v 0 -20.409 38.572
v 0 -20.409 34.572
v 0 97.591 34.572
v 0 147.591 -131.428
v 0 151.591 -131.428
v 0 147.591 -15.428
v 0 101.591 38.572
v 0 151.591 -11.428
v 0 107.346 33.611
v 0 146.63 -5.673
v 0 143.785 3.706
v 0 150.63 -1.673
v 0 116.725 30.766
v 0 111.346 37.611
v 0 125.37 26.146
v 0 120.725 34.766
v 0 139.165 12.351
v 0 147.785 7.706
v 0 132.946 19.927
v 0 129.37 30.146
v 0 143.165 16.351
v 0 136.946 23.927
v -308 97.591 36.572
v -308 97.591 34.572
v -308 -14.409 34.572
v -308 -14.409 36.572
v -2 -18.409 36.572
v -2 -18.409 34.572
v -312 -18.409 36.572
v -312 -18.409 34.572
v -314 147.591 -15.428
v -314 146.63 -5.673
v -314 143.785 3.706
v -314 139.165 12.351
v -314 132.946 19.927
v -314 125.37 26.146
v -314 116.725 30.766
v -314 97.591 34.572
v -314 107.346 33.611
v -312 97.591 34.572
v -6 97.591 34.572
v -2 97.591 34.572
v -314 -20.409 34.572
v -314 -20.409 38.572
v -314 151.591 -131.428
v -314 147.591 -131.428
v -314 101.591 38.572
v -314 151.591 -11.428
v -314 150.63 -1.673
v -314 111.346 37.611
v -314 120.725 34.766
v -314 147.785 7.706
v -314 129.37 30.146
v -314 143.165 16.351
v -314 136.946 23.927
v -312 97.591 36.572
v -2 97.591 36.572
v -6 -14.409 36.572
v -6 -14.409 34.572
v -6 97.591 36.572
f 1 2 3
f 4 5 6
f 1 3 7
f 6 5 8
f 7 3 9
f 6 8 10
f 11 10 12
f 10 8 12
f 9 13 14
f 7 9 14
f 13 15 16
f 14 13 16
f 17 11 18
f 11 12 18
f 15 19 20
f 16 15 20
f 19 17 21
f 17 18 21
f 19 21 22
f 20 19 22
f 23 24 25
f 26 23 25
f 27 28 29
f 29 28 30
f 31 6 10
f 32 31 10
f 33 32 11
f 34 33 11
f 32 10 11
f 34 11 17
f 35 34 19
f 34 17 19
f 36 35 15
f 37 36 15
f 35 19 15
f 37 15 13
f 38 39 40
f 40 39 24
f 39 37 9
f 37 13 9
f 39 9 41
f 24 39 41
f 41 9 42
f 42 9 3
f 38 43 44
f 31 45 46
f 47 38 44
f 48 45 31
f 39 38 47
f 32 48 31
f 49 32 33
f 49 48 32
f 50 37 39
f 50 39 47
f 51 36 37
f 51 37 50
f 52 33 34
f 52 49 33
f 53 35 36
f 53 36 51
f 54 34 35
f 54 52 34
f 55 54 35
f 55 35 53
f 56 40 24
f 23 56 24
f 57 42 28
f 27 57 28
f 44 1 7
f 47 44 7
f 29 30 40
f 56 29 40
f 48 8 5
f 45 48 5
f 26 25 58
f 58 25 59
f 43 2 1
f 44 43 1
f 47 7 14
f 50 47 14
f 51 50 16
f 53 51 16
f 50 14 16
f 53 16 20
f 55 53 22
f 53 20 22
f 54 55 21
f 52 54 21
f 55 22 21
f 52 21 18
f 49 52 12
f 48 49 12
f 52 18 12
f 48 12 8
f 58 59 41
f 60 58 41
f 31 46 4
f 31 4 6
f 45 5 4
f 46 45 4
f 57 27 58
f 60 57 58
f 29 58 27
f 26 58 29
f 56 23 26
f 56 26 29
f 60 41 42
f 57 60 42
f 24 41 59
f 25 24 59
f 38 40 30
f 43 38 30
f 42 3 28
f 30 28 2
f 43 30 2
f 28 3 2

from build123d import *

# Parameters (mm, degrees)
SALIENTE_EXTRUIR1_DEPTH = 314
CORTAR_EXTRUIR1_DEPTH   = 2


with BuildPart() as part:
    # Croquis2 → Saliente-Extruir1 (new body)
    with BuildSketch(Plane(origin=(0, 0, 0), x_dir=(0, 0, -1), z_dir=(1, 0, 0))):
        with BuildLine():
            Line((-38.572123539, -20.408891327), (-38.572123539, 101.591108673))
            ThreePointArc((-38.572123539, 101.591108673), (-23.927462599, 136.946447732), (11.427876461, 151.591108673))
            Line((11.427876461, 151.591108673), (131.427876461, 151.591108673))
            Line((131.427876461, 151.591108673), (131.427876461, 147.591108673))
            Line((131.427876461, 147.591108673), (15.427876461, 147.591108673))
            ThreePointArc((15.427876461, 147.591108673), (-19.927462599, 132.946447732), (-34.572123539, 97.591108673))
            Line((-34.572123539, 97.591108673), (-34.572123539, -20.408891327))
            Line((-34.572123539, -20.408891327), (-38.572123539, -20.408891327))
        make_face()
    extrude(amount=-SALIENTE_EXTRUIR1_DEPTH)

    # Croquis3 → Cortar-Extruir1 (cut)
    with BuildSketch(Plane(origin=(0, 0, 34.572123539), x_dir=(-1, 0, 0), z_dir=(0, 0, -1))):
        Polygon((2, 97.591108673), (2, -18.408891327), (312, -18.408891327), (312, 97.591108673), (308, 97.591108673), (308, -14.408891327), (6, -14.408891327), (6, 97.591108673), align=None)
    extrude(amount=-CORTAR_EXTRUIR1_DEPTH, mode=Mode.SUBTRACT)


solid = part.part
